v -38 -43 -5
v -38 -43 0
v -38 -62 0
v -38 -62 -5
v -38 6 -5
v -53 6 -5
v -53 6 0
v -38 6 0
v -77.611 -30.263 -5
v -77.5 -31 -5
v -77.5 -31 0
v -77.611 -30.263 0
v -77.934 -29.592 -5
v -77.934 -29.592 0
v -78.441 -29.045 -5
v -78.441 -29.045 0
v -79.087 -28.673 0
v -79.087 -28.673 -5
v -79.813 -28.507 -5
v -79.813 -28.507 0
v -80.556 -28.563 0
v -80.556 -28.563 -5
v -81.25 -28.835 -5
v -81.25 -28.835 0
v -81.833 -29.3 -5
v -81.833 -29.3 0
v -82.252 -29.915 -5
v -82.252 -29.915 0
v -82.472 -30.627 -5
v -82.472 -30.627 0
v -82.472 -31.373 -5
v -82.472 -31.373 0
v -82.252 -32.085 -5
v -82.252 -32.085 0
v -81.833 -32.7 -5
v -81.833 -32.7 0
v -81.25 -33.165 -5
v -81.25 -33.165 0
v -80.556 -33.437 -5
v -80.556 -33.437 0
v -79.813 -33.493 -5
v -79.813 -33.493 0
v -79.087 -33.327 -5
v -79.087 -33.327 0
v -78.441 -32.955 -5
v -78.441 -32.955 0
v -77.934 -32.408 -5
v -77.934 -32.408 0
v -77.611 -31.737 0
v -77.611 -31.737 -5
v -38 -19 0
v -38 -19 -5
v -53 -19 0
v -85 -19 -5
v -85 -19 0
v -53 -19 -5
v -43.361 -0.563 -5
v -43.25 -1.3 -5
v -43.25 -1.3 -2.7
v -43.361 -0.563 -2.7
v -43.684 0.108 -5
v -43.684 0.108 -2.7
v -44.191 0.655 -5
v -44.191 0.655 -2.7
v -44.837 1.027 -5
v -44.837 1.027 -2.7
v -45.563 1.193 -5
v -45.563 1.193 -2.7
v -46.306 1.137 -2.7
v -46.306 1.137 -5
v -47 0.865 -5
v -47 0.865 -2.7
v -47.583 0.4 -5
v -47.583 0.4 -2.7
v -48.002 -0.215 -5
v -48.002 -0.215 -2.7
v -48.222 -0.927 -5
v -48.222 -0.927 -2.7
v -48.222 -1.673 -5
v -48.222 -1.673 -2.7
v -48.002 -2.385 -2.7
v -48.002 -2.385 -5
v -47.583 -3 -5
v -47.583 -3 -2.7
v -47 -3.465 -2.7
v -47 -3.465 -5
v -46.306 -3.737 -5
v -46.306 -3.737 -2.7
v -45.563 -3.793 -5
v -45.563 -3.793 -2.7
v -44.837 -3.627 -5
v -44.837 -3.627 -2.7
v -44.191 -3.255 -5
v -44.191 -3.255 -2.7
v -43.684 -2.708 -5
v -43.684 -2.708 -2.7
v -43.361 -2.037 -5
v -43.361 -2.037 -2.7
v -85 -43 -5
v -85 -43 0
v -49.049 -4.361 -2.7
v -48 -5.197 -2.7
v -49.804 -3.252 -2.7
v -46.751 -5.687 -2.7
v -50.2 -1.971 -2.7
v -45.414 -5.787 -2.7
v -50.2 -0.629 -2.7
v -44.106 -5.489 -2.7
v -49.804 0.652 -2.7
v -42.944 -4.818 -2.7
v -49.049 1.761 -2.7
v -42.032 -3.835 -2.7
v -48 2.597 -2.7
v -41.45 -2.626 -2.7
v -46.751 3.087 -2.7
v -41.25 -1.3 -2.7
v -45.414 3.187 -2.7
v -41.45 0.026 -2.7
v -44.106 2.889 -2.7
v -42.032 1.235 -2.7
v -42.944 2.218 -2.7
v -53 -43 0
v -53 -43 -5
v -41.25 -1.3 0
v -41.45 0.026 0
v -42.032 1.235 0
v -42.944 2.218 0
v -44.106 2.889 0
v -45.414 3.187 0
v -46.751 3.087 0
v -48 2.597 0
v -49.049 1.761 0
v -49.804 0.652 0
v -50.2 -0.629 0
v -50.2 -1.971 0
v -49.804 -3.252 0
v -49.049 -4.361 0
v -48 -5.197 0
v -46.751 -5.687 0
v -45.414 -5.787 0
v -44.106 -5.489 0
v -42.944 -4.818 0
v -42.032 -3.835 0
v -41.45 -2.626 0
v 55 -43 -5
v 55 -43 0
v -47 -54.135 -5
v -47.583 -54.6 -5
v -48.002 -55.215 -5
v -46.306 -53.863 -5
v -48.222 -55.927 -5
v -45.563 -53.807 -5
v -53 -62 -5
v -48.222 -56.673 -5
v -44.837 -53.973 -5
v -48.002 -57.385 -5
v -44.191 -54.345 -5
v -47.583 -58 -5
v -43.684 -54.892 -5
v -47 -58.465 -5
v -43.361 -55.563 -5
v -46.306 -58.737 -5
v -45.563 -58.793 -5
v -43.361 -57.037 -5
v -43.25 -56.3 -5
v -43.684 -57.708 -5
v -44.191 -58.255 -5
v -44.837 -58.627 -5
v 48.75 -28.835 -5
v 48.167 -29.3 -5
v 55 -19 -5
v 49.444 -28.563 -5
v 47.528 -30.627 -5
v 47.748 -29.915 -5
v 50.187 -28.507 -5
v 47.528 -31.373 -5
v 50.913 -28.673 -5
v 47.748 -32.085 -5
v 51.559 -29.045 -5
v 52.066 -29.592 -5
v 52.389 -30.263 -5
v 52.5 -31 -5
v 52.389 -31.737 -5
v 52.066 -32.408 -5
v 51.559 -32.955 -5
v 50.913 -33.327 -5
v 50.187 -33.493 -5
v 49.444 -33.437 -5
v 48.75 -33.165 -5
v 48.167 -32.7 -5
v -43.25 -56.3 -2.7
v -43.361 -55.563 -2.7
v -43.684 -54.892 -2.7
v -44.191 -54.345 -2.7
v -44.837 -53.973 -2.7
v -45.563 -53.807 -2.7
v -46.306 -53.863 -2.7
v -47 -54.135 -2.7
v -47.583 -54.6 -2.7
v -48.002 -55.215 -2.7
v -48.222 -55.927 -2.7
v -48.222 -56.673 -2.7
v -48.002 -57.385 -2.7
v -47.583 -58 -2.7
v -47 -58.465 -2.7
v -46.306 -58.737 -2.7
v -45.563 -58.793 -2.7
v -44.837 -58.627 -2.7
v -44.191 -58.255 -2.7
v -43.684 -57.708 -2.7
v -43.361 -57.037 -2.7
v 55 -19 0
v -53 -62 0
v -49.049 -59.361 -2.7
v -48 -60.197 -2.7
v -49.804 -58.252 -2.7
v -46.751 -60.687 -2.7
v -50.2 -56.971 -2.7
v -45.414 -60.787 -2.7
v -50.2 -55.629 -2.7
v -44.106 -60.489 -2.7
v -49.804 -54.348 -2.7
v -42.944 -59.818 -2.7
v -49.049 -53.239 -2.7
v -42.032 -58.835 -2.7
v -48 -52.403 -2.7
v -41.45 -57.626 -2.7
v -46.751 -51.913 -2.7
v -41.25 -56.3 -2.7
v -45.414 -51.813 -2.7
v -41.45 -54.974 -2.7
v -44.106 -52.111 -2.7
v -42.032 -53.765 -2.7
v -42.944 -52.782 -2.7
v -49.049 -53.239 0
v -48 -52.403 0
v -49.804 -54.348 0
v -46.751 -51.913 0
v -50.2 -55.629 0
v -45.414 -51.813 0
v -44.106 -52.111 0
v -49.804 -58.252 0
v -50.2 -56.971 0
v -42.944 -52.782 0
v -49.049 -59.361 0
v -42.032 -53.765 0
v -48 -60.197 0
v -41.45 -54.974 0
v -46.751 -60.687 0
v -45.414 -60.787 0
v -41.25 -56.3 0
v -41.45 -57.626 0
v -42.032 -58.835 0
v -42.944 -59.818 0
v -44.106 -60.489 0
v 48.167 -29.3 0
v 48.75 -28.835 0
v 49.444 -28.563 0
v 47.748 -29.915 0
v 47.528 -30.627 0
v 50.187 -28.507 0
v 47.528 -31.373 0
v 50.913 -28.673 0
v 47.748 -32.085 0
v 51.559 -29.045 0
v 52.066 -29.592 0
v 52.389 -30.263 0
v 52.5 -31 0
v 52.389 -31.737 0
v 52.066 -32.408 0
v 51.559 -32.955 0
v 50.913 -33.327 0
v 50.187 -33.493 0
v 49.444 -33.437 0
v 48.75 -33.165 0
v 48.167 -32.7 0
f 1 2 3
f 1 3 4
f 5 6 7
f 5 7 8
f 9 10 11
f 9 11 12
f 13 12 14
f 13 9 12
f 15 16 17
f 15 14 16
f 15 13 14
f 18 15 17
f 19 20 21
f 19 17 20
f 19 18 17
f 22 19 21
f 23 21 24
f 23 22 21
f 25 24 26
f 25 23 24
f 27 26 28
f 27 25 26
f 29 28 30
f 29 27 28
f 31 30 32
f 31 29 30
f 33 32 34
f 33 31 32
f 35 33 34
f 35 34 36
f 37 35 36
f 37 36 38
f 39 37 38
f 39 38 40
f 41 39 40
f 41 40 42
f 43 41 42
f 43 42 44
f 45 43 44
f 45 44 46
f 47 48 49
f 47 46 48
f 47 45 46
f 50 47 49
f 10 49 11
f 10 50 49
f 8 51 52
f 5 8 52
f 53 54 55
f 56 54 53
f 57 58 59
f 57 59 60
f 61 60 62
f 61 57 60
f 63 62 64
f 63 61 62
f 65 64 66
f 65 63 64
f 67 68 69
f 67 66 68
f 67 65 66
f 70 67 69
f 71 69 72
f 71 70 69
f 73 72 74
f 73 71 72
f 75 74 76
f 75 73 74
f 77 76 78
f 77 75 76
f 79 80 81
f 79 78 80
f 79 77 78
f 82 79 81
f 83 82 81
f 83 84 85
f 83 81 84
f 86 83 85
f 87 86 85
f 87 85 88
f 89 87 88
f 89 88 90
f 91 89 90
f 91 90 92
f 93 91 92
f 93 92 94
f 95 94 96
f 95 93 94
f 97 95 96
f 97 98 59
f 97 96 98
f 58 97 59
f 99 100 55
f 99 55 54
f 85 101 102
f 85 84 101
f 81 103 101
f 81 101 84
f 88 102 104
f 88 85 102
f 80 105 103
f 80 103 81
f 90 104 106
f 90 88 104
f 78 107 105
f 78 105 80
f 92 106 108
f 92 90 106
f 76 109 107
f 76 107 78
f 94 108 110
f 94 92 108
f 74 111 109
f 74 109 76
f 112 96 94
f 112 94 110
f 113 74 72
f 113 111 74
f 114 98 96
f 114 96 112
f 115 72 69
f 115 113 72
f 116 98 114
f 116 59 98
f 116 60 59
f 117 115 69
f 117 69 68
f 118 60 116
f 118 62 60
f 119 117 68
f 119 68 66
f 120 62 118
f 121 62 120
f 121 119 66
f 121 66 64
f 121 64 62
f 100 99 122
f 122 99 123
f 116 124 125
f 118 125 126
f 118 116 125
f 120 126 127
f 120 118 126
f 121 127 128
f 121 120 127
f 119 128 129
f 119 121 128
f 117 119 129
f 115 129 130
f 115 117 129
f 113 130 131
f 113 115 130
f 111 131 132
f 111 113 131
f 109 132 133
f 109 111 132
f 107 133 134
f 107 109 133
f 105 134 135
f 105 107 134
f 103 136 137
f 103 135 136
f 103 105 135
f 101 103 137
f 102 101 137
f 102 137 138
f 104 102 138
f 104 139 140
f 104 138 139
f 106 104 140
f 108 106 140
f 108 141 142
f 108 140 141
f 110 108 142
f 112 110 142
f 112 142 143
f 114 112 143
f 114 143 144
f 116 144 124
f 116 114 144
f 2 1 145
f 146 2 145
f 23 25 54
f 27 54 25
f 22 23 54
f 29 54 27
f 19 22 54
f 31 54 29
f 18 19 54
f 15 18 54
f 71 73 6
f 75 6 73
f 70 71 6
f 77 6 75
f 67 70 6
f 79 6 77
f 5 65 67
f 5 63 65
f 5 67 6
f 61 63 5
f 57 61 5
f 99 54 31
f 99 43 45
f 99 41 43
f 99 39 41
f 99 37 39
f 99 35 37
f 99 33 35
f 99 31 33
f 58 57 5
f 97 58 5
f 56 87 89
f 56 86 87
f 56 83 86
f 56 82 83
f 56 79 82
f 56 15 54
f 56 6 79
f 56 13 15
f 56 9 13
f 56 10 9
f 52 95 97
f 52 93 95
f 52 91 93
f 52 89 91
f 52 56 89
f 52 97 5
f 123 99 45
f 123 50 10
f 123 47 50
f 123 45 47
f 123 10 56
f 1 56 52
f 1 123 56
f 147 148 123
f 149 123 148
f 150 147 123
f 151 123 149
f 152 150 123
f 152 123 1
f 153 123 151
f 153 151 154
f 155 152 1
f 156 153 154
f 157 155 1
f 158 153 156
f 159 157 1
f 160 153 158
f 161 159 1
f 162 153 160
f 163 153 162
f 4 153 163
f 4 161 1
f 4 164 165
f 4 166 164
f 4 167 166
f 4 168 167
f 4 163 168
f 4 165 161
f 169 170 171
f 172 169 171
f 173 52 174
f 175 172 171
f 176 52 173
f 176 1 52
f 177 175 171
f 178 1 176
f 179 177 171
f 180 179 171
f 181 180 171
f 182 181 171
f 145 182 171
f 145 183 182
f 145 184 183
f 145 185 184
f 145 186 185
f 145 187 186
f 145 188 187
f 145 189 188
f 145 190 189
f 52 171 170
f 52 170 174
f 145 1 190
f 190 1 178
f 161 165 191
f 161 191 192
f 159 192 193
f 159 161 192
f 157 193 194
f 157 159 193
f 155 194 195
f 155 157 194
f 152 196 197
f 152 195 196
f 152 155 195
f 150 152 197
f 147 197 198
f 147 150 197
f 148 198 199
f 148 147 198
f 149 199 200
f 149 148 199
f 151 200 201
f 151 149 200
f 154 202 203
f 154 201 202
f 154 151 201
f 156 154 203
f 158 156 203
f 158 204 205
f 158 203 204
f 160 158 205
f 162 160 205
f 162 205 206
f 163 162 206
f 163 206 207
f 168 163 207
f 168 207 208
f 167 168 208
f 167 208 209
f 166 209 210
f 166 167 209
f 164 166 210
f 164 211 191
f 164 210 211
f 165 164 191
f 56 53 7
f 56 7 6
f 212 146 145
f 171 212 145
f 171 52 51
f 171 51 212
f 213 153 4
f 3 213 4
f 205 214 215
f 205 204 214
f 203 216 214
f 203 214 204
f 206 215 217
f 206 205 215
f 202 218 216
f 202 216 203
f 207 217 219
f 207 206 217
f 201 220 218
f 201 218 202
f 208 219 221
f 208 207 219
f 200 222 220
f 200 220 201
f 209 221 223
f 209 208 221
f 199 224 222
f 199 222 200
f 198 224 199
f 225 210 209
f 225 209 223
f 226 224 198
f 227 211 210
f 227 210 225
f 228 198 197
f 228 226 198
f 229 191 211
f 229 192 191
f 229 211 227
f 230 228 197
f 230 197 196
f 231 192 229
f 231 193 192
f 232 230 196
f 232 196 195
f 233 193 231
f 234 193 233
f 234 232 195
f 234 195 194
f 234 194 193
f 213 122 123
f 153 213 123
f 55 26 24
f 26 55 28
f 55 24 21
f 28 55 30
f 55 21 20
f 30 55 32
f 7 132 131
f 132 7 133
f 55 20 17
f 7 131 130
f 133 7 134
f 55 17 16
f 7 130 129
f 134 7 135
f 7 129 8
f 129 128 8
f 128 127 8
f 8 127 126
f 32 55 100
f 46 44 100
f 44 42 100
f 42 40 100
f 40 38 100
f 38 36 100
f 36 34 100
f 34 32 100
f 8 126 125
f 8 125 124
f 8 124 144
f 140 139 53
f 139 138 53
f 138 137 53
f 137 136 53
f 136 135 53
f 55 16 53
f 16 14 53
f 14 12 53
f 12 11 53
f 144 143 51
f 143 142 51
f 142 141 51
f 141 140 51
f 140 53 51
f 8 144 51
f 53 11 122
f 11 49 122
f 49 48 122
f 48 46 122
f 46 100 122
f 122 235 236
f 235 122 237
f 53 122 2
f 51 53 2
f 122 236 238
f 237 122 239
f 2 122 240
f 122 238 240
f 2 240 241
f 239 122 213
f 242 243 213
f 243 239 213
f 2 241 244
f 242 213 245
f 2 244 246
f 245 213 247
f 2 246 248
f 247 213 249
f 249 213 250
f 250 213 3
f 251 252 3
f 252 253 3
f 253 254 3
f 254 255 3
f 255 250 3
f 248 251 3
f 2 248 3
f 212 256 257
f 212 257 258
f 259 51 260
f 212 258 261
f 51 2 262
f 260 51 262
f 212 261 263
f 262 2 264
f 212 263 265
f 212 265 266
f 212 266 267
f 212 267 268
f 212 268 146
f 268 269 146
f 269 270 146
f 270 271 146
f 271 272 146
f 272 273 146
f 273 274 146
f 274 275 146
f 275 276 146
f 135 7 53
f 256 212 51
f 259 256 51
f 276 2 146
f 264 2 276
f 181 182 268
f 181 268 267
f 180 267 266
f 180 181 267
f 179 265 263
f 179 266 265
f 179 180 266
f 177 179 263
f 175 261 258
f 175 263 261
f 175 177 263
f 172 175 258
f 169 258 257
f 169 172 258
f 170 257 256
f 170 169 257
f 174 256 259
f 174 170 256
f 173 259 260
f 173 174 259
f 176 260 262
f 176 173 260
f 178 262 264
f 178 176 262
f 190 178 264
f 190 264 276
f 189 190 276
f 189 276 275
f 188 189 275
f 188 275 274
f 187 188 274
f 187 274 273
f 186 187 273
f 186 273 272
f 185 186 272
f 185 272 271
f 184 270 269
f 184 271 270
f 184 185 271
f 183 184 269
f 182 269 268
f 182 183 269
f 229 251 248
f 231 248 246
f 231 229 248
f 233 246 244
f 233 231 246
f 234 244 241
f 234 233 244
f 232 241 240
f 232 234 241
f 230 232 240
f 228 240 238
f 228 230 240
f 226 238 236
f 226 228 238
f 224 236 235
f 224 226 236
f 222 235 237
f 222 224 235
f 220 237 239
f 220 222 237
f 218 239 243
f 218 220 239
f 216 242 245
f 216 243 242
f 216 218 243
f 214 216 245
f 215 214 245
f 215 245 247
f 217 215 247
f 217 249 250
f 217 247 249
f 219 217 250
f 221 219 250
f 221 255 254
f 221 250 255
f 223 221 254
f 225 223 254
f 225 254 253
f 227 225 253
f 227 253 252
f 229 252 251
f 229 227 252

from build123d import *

# Parameters (mm, degrees)
CYLINDER063_R          = 4.5
CYLINDER063_DEPTH      = 10
CYLINDER064_R          = 4.5
CYLINDER064_DEPTH      = 10
CYLINDER058_R          = 2.5
CYLINDER058_DEPTH      = 10
CYLINDER059_R          = 2.5
CYLINDER059_DEPTH      = 10
CYLINDER060_R          = 2.5
CYLINDER060_DEPTH      = 10
CYLINDER061_R          = 2.5
CYLINDER061_DEPTH      = 10
CYLINDER057_R          = 2.5
CYLINDER057_DEPTH      = 10
CYLINDER062_R          = 2.5
CYLINDER062_DEPTH      = 10
BOX013_W               = 15
BOX013_H               = 5
BOX013_DEPTH           = 68
BOX012_W               = 140
BOX012_H               = 5
BOX012_DEPTH           = 24
CUT006_PLACEMENT_ANGLE = 270


with BuildPart() as cylinder063:
    # Cylinder063 → Cylinder063 (new body)
    with BuildSketch(Plane(origin=(-45.75, 0, -56.3), x_dir=(1, 0, 0), z_dir=(0, -1, 0))):
        Circle(CYLINDER063_R)
    extrude(amount=CYLINDER063_DEPTH)


with BuildPart() as m3bltinput001:
    # Cylinder064 → Cylinder064 (new body)
    with BuildSketch(Plane(origin=(-45.75, 0, -1.3), x_dir=(1, 0, 0), z_dir=(0, -1, 0))):
        Circle(CYLINDER064_R)
    extrude(amount=CYLINDER064_DEPTH)

    # Fusion023: union Cylinder063
    add(cylinder063.part)


with BuildPart() as m3bltinput001_1:
    # Fusion023 placement: moved
    add(m3bltinput001.part.moved(Location((0, 2.7, 0))))


with BuildPart() as cylinder058:
    # Cylinder058 → Cylinder058 (new body)
    with BuildSketch(Plane(origin=(115, 0, -31), x_dir=(1, 0, 0), z_dir=(0, -1, 0))):
        Circle(CYLINDER058_R)
    extrude(amount=CYLINDER058_DEPTH)


with BuildPart() as cylinder059:
    # Cylinder059 → Cylinder059 (new body)
    with BuildSketch(Plane(origin=(-80, 0, -31), x_dir=(1, 0, 0), z_dir=(0, -1, 0))):
        Circle(CYLINDER059_R)
    extrude(amount=CYLINDER059_DEPTH)


with BuildPart() as cylinder060:
    # Cylinder060 → Cylinder060 (new body)
    with BuildSketch(Plane(origin=(50, 0, -31), x_dir=(1, 0, 0), z_dir=(0, -1, 0))):
        Circle(CYLINDER060_R)
    extrude(amount=CYLINDER060_DEPTH)


with BuildPart() as cylinder061:
    # Cylinder061 → Cylinder061 (new body)
    with BuildSketch(Plane(origin=(-45.75, 0, -56.3), x_dir=(1, 0, 0), z_dir=(0, -1, 0))):
        Circle(CYLINDER061_R)
    extrude(amount=CYLINDER061_DEPTH)


with BuildPart() as cylinder057:
    # Cylinder057 → Cylinder057 (new body)
    with BuildSketch(Plane(origin=(-115, 0, -31), x_dir=(1, 0, 0), z_dir=(0, -1, 0))):
        Circle(CYLINDER057_R)
    extrude(amount=CYLINDER057_DEPTH)


with BuildPart() as fusion026:
    # Cylinder062 → Cylinder062 (new body)
    with BuildSketch(Plane(origin=(-45.75, 0, -1.3), x_dir=(1, 0, 0), z_dir=(0, -1, 0))):
        Circle(CYLINDER062_R)
    extrude(amount=CYLINDER062_DEPTH)

    # Fusion022: union Cylinder058, Cylinder059, Cylinder060, Cylinder061, Cylinder057
    add(cylinder058.part)
    add(cylinder059.part)
    add(cylinder060.part)
    add(cylinder061.part)
    add(cylinder057.part)


with BuildPart() as fusion026_1:
    # Fusion022 placement: moved
    add(fusion026.part.moved(Location((0, 5.1, 0))))

    # Fusion026: union M3BltInput001
    add(m3bltinput001_1.part)


with BuildPart() as cube011:
    # Box013 → Box013 (new body)
    with BuildSketch(Plane(origin=(-53, 0, -62), x_dir=(1, 0, 0), z_dir=(0, 0, 1))):
        with Locations((7.5, 2.5)):
            Rectangle(BOX013_W, BOX013_H)
    extrude(amount=BOX013_DEPTH)


with BuildPart() as powerbase001:
    # Box012 → Box012 (new body)
    with BuildSketch(Plane(origin=(-85, 0, -43), x_dir=(1, 0, 0), z_dir=(0, 0, 1))):
        with Locations((70, 2.5)):
            Rectangle(BOX012_W, BOX012_H)
    extrude(amount=BOX012_DEPTH)

    # Fusion021: union Cube011
    add(cube011.part)

    # Cut006: cut Fusion026
    add(fusion026_1.part, mode=Mode.SUBTRACT)


with BuildPart() as powerbase001_1:
    # Cut006 placement: moved
    add(powerbase001.part.rotate(Axis((0, 0, 0), (1, 0, 0)), CUT006_PLACEMENT_ANGLE))


solid = powerbase001_1.part
